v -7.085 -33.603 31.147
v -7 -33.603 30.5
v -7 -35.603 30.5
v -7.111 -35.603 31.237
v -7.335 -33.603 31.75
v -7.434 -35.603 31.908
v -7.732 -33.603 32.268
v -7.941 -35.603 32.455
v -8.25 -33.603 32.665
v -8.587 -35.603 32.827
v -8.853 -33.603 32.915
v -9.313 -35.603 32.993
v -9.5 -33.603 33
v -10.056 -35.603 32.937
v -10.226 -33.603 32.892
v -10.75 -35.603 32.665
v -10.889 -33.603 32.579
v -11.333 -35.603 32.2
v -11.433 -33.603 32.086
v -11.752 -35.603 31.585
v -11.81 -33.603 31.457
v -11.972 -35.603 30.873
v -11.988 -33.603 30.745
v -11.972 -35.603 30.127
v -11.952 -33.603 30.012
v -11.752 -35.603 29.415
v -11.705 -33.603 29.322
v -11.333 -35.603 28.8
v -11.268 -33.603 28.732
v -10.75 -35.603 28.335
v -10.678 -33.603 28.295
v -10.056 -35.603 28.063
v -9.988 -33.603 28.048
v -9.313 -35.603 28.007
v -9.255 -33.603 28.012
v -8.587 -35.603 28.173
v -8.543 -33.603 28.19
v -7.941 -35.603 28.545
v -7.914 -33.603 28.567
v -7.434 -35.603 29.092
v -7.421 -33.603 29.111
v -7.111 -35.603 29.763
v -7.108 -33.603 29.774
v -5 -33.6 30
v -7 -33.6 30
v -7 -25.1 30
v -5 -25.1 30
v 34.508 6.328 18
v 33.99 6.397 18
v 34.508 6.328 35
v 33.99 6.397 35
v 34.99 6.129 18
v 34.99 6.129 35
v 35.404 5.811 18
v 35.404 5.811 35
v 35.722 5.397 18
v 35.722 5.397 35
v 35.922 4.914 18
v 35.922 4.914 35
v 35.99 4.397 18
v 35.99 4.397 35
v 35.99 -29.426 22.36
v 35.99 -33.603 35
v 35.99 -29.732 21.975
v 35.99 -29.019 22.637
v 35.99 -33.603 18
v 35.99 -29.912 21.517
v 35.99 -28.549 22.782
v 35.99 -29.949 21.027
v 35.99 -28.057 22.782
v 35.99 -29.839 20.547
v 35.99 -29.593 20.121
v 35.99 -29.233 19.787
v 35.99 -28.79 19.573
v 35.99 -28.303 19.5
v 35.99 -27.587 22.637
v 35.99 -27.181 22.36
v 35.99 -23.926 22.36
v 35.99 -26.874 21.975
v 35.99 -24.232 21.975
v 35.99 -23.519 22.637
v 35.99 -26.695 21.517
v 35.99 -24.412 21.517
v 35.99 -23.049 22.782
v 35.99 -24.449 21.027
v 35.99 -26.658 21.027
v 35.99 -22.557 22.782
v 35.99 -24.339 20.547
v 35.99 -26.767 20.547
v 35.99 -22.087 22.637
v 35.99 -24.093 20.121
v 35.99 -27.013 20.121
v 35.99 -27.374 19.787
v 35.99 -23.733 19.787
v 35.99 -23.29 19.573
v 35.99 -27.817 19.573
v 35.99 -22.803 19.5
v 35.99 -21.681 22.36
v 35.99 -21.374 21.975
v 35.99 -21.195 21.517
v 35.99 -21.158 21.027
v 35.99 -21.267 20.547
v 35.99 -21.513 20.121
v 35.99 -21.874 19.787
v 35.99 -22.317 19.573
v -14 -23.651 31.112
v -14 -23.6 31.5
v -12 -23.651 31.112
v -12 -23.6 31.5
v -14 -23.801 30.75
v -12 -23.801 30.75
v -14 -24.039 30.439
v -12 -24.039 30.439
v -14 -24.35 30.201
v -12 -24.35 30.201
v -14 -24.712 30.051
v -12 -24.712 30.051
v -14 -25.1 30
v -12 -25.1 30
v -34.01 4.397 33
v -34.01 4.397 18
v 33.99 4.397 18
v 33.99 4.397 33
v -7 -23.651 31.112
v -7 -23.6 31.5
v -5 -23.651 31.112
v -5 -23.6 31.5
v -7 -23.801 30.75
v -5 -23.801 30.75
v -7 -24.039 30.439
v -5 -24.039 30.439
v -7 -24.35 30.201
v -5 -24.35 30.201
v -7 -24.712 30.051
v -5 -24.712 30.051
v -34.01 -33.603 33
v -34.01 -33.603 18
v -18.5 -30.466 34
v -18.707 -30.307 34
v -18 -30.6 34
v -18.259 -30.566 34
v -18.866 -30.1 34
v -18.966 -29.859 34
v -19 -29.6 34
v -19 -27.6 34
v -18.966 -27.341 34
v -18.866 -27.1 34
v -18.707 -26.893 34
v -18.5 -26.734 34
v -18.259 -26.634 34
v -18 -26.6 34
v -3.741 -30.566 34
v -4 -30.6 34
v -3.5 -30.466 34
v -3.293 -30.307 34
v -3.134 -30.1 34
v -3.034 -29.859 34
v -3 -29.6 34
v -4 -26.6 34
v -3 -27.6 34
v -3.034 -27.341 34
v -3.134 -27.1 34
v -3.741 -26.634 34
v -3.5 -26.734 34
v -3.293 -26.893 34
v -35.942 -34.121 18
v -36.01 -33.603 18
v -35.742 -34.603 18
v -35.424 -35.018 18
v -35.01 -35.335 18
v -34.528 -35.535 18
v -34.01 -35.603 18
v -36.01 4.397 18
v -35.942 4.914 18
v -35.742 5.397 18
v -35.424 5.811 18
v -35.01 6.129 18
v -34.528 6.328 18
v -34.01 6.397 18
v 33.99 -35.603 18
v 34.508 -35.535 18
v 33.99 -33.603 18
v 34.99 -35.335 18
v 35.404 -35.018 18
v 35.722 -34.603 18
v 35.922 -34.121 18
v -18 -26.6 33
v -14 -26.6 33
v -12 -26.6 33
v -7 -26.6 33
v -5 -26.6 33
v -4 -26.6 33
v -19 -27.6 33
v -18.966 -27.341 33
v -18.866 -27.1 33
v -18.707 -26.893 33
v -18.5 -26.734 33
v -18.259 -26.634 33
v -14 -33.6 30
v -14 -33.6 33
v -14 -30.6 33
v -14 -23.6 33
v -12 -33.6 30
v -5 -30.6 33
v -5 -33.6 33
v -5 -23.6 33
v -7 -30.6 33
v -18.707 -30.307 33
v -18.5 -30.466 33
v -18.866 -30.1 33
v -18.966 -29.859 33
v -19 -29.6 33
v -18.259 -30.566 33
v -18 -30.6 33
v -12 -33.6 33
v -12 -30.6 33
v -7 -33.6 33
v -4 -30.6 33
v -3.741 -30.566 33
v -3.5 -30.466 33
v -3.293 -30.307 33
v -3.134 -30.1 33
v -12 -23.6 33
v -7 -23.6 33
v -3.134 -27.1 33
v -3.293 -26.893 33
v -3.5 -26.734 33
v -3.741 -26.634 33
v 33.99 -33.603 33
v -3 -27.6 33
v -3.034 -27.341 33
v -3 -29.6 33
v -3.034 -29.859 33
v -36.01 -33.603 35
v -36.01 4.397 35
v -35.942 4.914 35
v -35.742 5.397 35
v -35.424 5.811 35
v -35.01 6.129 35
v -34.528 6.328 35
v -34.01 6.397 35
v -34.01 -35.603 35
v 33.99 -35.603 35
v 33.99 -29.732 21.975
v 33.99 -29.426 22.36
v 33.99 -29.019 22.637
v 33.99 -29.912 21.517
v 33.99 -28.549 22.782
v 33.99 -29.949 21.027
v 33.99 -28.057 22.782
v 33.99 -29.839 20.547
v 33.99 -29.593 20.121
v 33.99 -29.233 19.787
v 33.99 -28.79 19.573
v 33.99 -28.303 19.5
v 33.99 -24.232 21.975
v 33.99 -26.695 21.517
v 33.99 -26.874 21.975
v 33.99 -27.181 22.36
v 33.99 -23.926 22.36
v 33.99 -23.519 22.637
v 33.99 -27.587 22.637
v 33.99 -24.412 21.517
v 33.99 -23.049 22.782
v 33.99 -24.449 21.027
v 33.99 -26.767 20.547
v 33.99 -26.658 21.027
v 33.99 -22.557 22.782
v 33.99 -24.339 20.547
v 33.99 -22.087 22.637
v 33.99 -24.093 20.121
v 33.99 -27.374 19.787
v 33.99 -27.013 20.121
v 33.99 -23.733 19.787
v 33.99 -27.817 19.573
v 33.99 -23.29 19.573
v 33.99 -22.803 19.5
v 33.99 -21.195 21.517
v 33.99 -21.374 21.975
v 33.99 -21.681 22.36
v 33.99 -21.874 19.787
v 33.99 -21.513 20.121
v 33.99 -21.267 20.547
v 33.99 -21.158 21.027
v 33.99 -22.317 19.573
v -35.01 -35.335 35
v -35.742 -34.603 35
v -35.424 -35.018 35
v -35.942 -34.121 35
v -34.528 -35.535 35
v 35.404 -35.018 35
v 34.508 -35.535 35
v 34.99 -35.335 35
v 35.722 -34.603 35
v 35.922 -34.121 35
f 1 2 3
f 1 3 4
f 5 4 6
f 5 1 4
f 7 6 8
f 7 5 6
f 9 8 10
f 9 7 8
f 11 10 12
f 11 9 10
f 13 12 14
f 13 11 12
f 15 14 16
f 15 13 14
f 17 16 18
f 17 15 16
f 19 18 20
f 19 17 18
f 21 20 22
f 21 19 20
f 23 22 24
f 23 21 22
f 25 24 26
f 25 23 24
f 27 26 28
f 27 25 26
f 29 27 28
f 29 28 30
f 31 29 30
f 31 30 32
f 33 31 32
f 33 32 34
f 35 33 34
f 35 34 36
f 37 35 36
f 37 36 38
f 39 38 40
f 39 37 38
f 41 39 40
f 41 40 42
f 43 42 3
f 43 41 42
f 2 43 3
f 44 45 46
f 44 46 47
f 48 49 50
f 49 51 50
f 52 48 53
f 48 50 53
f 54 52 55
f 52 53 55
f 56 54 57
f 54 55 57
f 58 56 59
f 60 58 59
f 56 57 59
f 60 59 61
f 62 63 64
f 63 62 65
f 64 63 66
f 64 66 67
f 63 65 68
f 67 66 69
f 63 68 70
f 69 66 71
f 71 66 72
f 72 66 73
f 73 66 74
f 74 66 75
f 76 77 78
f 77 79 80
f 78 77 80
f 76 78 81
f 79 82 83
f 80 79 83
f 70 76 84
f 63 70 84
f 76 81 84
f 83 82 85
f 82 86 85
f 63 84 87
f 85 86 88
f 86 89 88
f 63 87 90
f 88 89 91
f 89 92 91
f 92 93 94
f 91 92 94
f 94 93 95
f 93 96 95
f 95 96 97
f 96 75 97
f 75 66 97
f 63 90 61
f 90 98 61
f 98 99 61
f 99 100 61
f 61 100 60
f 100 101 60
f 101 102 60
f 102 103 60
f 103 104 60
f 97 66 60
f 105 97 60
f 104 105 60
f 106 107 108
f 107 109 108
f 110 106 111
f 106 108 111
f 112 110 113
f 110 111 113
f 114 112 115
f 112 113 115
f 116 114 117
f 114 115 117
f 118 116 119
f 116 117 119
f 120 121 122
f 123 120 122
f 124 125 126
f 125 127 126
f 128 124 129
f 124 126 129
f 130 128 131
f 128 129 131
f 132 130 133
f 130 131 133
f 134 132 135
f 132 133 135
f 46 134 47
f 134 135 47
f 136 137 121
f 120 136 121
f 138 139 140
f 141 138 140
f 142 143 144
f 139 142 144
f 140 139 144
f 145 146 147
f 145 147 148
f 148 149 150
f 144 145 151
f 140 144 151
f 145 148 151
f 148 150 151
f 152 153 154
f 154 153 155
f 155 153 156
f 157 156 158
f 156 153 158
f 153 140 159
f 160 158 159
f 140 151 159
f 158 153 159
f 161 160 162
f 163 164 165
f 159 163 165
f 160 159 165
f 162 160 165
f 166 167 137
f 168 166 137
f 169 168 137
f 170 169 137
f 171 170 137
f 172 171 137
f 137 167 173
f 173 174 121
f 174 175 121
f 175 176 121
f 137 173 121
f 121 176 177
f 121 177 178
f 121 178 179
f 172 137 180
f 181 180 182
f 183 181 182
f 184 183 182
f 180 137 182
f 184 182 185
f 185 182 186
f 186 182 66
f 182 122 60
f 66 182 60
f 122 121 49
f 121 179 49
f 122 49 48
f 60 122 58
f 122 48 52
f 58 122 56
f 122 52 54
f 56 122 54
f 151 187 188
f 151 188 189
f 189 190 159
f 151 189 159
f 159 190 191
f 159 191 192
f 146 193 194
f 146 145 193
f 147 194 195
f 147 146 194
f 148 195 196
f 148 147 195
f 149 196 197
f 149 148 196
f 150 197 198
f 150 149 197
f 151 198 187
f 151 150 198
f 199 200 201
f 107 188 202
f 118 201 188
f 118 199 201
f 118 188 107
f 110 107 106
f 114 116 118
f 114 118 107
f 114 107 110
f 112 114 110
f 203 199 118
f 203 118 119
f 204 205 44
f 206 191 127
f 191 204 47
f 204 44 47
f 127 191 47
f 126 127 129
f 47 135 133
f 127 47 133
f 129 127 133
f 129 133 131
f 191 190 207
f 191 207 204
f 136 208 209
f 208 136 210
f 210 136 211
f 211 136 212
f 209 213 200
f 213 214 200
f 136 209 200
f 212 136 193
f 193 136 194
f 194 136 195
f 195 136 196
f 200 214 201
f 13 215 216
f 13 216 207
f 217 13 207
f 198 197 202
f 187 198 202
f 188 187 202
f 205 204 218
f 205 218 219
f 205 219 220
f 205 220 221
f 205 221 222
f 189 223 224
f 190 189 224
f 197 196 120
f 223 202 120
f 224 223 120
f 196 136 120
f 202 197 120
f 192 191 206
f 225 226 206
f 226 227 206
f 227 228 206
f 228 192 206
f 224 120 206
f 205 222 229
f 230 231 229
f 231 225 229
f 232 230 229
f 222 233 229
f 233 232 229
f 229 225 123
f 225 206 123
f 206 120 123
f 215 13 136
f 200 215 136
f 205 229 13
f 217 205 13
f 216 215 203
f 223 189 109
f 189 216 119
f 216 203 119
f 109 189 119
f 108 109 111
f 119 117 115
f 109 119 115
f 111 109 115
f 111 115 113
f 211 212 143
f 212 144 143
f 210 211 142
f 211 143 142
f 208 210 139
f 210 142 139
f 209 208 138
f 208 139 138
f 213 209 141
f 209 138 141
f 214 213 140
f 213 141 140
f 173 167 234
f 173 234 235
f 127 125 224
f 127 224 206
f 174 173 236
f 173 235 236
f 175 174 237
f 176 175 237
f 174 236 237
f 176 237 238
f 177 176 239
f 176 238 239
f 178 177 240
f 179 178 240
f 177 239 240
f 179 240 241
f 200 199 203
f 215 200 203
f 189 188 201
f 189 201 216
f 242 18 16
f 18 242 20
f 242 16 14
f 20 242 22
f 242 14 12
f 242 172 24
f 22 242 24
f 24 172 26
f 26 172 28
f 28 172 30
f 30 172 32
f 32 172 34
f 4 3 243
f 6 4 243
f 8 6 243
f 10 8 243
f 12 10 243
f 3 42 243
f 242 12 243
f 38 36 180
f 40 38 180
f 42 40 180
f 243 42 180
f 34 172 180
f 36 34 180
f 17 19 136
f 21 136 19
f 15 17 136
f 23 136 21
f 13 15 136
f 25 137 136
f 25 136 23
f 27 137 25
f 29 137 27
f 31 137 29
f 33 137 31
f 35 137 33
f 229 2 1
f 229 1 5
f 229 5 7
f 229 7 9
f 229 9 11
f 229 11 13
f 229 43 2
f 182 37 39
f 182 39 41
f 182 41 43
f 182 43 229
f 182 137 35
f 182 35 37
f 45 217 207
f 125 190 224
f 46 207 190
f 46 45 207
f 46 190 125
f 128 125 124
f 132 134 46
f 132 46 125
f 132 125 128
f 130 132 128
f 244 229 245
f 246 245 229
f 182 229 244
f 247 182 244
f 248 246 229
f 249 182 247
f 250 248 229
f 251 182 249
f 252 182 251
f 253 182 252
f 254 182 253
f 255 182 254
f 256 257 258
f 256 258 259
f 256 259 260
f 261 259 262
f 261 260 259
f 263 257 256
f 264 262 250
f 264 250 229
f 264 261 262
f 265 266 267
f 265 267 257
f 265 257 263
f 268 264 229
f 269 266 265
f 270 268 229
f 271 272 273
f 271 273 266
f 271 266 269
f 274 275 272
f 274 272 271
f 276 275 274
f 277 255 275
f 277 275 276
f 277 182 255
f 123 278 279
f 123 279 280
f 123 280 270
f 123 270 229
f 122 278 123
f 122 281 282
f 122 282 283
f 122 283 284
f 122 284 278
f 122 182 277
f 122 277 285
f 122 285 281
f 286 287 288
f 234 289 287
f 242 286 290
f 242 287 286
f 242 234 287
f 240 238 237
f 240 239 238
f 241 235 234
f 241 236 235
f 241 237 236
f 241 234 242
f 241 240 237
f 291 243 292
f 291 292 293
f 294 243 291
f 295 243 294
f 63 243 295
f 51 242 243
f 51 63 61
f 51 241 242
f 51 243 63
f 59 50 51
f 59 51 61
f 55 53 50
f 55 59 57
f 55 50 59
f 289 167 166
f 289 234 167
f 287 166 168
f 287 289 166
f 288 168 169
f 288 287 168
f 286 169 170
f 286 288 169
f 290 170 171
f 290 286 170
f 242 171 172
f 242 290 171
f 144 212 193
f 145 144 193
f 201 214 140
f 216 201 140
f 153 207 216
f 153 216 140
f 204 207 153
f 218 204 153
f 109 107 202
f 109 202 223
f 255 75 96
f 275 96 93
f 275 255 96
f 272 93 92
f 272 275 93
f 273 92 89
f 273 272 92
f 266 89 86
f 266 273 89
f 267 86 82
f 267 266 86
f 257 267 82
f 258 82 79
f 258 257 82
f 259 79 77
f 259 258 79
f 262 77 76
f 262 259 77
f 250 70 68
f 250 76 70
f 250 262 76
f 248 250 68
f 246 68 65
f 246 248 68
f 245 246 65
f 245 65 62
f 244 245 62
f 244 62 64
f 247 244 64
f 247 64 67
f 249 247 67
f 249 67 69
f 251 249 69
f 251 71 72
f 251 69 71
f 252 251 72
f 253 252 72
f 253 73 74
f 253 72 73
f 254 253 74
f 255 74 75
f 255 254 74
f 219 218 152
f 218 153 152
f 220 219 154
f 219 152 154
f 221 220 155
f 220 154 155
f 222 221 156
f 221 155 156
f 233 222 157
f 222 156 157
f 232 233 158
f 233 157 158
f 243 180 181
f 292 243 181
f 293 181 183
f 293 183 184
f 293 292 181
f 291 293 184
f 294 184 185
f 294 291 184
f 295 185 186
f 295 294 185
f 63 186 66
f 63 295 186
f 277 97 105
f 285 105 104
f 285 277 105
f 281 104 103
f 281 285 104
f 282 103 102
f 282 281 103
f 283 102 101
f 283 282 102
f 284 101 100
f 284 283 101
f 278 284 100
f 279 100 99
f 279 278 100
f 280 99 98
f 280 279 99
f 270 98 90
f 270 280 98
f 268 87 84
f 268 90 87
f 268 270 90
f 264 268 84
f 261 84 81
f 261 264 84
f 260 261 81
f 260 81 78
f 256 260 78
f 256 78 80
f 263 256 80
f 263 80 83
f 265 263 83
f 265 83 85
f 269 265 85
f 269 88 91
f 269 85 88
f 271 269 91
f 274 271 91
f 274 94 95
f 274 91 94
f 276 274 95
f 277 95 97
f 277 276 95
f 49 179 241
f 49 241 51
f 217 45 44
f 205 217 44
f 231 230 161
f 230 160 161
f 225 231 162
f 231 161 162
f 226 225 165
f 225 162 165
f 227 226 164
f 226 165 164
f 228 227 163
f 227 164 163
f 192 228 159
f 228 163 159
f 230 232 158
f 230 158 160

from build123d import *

# Parameters (mm, degrees)
BOX017_W          = 16
BOX017_H          = 4
BOX017_DEPTH      = 1
FILLET004_R       = 1
CYLINDER025_R     = 1.65
CYLINDER025_DEPTH = 10
CYLINDER024_R     = 1.65
CYLINDER024_DEPTH = 10
BOX015_W          = 2
BOX015_H          = 10
BOX015_DEPTH      = 5
FILLET006_R       = 1.5
CYLINDER023_R     = 2.5
CYLINDER023_DEPTH = 2
BOX009_W          = 68
BOX009_H          = 38
BOX009_DEPTH      = 15
BOX008_W          = 72
BOX008_H          = 42
BOX008_DEPTH      = 17
FILLET_R          = 2
BOX018_W          = 2
BOX018_H          = 10
BOX018_DEPTH      = 5
FILLET005_R       = 1.5


with BuildPart() as fillet004:
    # Box017 → Box017 (new body)
    with BuildSketch(Plane(origin=(-19, -30.6, 33), x_dir=(1, 0, 0), z_dir=(0, 0, 1))):
        with Locations((8, 2)):
            Rectangle(BOX017_W, BOX017_H)
    extrude(amount=BOX017_DEPTH)

    # Fillet004
    fillet004_edges = [fillet004.edges().sort_by_distance(p)[0] for p in [
        (-19, -30.6, 33.5),
        (-19, -26.6, 33.5),
        (-3, -30.6, 33.5),
        (-3, -26.6, 33.5),
    ]]
    fillet(fillet004_edges, radius=FILLET004_R)


with BuildPart() as cylinder025:
    # Cylinder025 → Cylinder025 (new body)
    with BuildSketch(Plane(origin=(33.99, -22.8034, 21.15), x_dir=(0, 0, -1), z_dir=(1, 0, 0))):
        Circle(CYLINDER025_R)
    extrude(amount=CYLINDER025_DEPTH)


with BuildPart() as fusion018:
    # Cylinder024 → Cylinder024 (new body)
    with BuildSketch(Plane(origin=(33.99, -28.3034, 21.15), x_dir=(0, 0, -1), z_dir=(1, 0, 0))):
        Circle(CYLINDER024_R)
    extrude(amount=CYLINDER024_DEPTH)

    # Fusion018: union Cylinder025
    add(cylinder025.part)


with BuildPart() as fillet006:
    # Box015 → Box015 (new body)
    with BuildSketch(Plane(origin=(-14, -33.6, 30), x_dir=(1, 0, 0), z_dir=(0, 0, 1))):
        with Locations((1, 5)):
            Rectangle(BOX015_W, BOX015_H)
    extrude(amount=BOX015_DEPTH)

    # Fillet006
    fillet006_edges = [fillet006.edges().sort_by_distance(p)[0] for p in [
        (-13, -23.6, 30),
    ]]
    fillet(fillet006_edges, radius=FILLET006_R)


with BuildPart() as cylinder023:
    # Cylinder023 → Cylinder023 (new body)
    with BuildSketch(Plane(origin=(-9.5, -33.6034, 30.5), x_dir=(1, 0, 0), z_dir=(0, -1, 0))):
        Circle(CYLINDER023_R)
    extrude(amount=CYLINDER023_DEPTH)


with BuildPart() as kostka009:
    # Box009 → Box009 (new body)
    with BuildSketch(Plane(origin=(-34.01, -33.6034, 18), x_dir=(1, 0, 0), z_dir=(0, 0, 1))):
        with Locations((34, 19)):
            Rectangle(BOX009_W, BOX009_H)
    extrude(amount=BOX009_DEPTH)


with BuildPart() as cut020:
    # Box008 → Box008 (new body)
    with BuildSketch(Plane(origin=(-36.01, -35.6034, 18), x_dir=(1, 0, 0), z_dir=(0, 0, 1))):
        with Locations((36, 21)):
            Rectangle(BOX008_W, BOX008_H)
    extrude(amount=BOX008_DEPTH)

    # Cut005: cut Kostka009
    add(kostka009.part, mode=Mode.SUBTRACT)

    # Fillet
    fillet_edges = [cut020.edges().sort_by_distance(p)[0] for p in [
        (-36.01, -35.6034, 26.5),
        (-36.01, 6.3966, 26.5),
        (35.99, -35.6034, 26.5),
        (35.99, 6.3966, 26.5),
    ]]
    fillet(fillet_edges, radius=FILLET_R)

    # Cut020: cut Cylinder023
    add(cylinder023.part, mode=Mode.SUBTRACT)


with BuildPart() as cover:
    # Box018 → Box018 (new body)
    with BuildSketch(Plane(origin=(-7, -33.6, 30), x_dir=(1, 0, 0), z_dir=(0, 0, 1))):
        with Locations((1, 5)):
            Rectangle(BOX018_W, BOX018_H)
    extrude(amount=BOX018_DEPTH)

    # Fillet005
    fillet005_edges = [cover.edges().sort_by_distance(p)[0] for p in [
        (-6, -23.6, 30),
    ]]
    fillet(fillet005_edges, radius=FILLET005_R)

    # Fusion017: union Fillet006, Cut020
    add(fillet006.part)
    add(cut020.part)

    # Cut021: cut Fusion018
    add(fusion018.part, mode=Mode.SUBTRACT)

    # Cut022: cut Fillet004
    add(fillet004.part, mode=Mode.SUBTRACT)


solid = cover.part
